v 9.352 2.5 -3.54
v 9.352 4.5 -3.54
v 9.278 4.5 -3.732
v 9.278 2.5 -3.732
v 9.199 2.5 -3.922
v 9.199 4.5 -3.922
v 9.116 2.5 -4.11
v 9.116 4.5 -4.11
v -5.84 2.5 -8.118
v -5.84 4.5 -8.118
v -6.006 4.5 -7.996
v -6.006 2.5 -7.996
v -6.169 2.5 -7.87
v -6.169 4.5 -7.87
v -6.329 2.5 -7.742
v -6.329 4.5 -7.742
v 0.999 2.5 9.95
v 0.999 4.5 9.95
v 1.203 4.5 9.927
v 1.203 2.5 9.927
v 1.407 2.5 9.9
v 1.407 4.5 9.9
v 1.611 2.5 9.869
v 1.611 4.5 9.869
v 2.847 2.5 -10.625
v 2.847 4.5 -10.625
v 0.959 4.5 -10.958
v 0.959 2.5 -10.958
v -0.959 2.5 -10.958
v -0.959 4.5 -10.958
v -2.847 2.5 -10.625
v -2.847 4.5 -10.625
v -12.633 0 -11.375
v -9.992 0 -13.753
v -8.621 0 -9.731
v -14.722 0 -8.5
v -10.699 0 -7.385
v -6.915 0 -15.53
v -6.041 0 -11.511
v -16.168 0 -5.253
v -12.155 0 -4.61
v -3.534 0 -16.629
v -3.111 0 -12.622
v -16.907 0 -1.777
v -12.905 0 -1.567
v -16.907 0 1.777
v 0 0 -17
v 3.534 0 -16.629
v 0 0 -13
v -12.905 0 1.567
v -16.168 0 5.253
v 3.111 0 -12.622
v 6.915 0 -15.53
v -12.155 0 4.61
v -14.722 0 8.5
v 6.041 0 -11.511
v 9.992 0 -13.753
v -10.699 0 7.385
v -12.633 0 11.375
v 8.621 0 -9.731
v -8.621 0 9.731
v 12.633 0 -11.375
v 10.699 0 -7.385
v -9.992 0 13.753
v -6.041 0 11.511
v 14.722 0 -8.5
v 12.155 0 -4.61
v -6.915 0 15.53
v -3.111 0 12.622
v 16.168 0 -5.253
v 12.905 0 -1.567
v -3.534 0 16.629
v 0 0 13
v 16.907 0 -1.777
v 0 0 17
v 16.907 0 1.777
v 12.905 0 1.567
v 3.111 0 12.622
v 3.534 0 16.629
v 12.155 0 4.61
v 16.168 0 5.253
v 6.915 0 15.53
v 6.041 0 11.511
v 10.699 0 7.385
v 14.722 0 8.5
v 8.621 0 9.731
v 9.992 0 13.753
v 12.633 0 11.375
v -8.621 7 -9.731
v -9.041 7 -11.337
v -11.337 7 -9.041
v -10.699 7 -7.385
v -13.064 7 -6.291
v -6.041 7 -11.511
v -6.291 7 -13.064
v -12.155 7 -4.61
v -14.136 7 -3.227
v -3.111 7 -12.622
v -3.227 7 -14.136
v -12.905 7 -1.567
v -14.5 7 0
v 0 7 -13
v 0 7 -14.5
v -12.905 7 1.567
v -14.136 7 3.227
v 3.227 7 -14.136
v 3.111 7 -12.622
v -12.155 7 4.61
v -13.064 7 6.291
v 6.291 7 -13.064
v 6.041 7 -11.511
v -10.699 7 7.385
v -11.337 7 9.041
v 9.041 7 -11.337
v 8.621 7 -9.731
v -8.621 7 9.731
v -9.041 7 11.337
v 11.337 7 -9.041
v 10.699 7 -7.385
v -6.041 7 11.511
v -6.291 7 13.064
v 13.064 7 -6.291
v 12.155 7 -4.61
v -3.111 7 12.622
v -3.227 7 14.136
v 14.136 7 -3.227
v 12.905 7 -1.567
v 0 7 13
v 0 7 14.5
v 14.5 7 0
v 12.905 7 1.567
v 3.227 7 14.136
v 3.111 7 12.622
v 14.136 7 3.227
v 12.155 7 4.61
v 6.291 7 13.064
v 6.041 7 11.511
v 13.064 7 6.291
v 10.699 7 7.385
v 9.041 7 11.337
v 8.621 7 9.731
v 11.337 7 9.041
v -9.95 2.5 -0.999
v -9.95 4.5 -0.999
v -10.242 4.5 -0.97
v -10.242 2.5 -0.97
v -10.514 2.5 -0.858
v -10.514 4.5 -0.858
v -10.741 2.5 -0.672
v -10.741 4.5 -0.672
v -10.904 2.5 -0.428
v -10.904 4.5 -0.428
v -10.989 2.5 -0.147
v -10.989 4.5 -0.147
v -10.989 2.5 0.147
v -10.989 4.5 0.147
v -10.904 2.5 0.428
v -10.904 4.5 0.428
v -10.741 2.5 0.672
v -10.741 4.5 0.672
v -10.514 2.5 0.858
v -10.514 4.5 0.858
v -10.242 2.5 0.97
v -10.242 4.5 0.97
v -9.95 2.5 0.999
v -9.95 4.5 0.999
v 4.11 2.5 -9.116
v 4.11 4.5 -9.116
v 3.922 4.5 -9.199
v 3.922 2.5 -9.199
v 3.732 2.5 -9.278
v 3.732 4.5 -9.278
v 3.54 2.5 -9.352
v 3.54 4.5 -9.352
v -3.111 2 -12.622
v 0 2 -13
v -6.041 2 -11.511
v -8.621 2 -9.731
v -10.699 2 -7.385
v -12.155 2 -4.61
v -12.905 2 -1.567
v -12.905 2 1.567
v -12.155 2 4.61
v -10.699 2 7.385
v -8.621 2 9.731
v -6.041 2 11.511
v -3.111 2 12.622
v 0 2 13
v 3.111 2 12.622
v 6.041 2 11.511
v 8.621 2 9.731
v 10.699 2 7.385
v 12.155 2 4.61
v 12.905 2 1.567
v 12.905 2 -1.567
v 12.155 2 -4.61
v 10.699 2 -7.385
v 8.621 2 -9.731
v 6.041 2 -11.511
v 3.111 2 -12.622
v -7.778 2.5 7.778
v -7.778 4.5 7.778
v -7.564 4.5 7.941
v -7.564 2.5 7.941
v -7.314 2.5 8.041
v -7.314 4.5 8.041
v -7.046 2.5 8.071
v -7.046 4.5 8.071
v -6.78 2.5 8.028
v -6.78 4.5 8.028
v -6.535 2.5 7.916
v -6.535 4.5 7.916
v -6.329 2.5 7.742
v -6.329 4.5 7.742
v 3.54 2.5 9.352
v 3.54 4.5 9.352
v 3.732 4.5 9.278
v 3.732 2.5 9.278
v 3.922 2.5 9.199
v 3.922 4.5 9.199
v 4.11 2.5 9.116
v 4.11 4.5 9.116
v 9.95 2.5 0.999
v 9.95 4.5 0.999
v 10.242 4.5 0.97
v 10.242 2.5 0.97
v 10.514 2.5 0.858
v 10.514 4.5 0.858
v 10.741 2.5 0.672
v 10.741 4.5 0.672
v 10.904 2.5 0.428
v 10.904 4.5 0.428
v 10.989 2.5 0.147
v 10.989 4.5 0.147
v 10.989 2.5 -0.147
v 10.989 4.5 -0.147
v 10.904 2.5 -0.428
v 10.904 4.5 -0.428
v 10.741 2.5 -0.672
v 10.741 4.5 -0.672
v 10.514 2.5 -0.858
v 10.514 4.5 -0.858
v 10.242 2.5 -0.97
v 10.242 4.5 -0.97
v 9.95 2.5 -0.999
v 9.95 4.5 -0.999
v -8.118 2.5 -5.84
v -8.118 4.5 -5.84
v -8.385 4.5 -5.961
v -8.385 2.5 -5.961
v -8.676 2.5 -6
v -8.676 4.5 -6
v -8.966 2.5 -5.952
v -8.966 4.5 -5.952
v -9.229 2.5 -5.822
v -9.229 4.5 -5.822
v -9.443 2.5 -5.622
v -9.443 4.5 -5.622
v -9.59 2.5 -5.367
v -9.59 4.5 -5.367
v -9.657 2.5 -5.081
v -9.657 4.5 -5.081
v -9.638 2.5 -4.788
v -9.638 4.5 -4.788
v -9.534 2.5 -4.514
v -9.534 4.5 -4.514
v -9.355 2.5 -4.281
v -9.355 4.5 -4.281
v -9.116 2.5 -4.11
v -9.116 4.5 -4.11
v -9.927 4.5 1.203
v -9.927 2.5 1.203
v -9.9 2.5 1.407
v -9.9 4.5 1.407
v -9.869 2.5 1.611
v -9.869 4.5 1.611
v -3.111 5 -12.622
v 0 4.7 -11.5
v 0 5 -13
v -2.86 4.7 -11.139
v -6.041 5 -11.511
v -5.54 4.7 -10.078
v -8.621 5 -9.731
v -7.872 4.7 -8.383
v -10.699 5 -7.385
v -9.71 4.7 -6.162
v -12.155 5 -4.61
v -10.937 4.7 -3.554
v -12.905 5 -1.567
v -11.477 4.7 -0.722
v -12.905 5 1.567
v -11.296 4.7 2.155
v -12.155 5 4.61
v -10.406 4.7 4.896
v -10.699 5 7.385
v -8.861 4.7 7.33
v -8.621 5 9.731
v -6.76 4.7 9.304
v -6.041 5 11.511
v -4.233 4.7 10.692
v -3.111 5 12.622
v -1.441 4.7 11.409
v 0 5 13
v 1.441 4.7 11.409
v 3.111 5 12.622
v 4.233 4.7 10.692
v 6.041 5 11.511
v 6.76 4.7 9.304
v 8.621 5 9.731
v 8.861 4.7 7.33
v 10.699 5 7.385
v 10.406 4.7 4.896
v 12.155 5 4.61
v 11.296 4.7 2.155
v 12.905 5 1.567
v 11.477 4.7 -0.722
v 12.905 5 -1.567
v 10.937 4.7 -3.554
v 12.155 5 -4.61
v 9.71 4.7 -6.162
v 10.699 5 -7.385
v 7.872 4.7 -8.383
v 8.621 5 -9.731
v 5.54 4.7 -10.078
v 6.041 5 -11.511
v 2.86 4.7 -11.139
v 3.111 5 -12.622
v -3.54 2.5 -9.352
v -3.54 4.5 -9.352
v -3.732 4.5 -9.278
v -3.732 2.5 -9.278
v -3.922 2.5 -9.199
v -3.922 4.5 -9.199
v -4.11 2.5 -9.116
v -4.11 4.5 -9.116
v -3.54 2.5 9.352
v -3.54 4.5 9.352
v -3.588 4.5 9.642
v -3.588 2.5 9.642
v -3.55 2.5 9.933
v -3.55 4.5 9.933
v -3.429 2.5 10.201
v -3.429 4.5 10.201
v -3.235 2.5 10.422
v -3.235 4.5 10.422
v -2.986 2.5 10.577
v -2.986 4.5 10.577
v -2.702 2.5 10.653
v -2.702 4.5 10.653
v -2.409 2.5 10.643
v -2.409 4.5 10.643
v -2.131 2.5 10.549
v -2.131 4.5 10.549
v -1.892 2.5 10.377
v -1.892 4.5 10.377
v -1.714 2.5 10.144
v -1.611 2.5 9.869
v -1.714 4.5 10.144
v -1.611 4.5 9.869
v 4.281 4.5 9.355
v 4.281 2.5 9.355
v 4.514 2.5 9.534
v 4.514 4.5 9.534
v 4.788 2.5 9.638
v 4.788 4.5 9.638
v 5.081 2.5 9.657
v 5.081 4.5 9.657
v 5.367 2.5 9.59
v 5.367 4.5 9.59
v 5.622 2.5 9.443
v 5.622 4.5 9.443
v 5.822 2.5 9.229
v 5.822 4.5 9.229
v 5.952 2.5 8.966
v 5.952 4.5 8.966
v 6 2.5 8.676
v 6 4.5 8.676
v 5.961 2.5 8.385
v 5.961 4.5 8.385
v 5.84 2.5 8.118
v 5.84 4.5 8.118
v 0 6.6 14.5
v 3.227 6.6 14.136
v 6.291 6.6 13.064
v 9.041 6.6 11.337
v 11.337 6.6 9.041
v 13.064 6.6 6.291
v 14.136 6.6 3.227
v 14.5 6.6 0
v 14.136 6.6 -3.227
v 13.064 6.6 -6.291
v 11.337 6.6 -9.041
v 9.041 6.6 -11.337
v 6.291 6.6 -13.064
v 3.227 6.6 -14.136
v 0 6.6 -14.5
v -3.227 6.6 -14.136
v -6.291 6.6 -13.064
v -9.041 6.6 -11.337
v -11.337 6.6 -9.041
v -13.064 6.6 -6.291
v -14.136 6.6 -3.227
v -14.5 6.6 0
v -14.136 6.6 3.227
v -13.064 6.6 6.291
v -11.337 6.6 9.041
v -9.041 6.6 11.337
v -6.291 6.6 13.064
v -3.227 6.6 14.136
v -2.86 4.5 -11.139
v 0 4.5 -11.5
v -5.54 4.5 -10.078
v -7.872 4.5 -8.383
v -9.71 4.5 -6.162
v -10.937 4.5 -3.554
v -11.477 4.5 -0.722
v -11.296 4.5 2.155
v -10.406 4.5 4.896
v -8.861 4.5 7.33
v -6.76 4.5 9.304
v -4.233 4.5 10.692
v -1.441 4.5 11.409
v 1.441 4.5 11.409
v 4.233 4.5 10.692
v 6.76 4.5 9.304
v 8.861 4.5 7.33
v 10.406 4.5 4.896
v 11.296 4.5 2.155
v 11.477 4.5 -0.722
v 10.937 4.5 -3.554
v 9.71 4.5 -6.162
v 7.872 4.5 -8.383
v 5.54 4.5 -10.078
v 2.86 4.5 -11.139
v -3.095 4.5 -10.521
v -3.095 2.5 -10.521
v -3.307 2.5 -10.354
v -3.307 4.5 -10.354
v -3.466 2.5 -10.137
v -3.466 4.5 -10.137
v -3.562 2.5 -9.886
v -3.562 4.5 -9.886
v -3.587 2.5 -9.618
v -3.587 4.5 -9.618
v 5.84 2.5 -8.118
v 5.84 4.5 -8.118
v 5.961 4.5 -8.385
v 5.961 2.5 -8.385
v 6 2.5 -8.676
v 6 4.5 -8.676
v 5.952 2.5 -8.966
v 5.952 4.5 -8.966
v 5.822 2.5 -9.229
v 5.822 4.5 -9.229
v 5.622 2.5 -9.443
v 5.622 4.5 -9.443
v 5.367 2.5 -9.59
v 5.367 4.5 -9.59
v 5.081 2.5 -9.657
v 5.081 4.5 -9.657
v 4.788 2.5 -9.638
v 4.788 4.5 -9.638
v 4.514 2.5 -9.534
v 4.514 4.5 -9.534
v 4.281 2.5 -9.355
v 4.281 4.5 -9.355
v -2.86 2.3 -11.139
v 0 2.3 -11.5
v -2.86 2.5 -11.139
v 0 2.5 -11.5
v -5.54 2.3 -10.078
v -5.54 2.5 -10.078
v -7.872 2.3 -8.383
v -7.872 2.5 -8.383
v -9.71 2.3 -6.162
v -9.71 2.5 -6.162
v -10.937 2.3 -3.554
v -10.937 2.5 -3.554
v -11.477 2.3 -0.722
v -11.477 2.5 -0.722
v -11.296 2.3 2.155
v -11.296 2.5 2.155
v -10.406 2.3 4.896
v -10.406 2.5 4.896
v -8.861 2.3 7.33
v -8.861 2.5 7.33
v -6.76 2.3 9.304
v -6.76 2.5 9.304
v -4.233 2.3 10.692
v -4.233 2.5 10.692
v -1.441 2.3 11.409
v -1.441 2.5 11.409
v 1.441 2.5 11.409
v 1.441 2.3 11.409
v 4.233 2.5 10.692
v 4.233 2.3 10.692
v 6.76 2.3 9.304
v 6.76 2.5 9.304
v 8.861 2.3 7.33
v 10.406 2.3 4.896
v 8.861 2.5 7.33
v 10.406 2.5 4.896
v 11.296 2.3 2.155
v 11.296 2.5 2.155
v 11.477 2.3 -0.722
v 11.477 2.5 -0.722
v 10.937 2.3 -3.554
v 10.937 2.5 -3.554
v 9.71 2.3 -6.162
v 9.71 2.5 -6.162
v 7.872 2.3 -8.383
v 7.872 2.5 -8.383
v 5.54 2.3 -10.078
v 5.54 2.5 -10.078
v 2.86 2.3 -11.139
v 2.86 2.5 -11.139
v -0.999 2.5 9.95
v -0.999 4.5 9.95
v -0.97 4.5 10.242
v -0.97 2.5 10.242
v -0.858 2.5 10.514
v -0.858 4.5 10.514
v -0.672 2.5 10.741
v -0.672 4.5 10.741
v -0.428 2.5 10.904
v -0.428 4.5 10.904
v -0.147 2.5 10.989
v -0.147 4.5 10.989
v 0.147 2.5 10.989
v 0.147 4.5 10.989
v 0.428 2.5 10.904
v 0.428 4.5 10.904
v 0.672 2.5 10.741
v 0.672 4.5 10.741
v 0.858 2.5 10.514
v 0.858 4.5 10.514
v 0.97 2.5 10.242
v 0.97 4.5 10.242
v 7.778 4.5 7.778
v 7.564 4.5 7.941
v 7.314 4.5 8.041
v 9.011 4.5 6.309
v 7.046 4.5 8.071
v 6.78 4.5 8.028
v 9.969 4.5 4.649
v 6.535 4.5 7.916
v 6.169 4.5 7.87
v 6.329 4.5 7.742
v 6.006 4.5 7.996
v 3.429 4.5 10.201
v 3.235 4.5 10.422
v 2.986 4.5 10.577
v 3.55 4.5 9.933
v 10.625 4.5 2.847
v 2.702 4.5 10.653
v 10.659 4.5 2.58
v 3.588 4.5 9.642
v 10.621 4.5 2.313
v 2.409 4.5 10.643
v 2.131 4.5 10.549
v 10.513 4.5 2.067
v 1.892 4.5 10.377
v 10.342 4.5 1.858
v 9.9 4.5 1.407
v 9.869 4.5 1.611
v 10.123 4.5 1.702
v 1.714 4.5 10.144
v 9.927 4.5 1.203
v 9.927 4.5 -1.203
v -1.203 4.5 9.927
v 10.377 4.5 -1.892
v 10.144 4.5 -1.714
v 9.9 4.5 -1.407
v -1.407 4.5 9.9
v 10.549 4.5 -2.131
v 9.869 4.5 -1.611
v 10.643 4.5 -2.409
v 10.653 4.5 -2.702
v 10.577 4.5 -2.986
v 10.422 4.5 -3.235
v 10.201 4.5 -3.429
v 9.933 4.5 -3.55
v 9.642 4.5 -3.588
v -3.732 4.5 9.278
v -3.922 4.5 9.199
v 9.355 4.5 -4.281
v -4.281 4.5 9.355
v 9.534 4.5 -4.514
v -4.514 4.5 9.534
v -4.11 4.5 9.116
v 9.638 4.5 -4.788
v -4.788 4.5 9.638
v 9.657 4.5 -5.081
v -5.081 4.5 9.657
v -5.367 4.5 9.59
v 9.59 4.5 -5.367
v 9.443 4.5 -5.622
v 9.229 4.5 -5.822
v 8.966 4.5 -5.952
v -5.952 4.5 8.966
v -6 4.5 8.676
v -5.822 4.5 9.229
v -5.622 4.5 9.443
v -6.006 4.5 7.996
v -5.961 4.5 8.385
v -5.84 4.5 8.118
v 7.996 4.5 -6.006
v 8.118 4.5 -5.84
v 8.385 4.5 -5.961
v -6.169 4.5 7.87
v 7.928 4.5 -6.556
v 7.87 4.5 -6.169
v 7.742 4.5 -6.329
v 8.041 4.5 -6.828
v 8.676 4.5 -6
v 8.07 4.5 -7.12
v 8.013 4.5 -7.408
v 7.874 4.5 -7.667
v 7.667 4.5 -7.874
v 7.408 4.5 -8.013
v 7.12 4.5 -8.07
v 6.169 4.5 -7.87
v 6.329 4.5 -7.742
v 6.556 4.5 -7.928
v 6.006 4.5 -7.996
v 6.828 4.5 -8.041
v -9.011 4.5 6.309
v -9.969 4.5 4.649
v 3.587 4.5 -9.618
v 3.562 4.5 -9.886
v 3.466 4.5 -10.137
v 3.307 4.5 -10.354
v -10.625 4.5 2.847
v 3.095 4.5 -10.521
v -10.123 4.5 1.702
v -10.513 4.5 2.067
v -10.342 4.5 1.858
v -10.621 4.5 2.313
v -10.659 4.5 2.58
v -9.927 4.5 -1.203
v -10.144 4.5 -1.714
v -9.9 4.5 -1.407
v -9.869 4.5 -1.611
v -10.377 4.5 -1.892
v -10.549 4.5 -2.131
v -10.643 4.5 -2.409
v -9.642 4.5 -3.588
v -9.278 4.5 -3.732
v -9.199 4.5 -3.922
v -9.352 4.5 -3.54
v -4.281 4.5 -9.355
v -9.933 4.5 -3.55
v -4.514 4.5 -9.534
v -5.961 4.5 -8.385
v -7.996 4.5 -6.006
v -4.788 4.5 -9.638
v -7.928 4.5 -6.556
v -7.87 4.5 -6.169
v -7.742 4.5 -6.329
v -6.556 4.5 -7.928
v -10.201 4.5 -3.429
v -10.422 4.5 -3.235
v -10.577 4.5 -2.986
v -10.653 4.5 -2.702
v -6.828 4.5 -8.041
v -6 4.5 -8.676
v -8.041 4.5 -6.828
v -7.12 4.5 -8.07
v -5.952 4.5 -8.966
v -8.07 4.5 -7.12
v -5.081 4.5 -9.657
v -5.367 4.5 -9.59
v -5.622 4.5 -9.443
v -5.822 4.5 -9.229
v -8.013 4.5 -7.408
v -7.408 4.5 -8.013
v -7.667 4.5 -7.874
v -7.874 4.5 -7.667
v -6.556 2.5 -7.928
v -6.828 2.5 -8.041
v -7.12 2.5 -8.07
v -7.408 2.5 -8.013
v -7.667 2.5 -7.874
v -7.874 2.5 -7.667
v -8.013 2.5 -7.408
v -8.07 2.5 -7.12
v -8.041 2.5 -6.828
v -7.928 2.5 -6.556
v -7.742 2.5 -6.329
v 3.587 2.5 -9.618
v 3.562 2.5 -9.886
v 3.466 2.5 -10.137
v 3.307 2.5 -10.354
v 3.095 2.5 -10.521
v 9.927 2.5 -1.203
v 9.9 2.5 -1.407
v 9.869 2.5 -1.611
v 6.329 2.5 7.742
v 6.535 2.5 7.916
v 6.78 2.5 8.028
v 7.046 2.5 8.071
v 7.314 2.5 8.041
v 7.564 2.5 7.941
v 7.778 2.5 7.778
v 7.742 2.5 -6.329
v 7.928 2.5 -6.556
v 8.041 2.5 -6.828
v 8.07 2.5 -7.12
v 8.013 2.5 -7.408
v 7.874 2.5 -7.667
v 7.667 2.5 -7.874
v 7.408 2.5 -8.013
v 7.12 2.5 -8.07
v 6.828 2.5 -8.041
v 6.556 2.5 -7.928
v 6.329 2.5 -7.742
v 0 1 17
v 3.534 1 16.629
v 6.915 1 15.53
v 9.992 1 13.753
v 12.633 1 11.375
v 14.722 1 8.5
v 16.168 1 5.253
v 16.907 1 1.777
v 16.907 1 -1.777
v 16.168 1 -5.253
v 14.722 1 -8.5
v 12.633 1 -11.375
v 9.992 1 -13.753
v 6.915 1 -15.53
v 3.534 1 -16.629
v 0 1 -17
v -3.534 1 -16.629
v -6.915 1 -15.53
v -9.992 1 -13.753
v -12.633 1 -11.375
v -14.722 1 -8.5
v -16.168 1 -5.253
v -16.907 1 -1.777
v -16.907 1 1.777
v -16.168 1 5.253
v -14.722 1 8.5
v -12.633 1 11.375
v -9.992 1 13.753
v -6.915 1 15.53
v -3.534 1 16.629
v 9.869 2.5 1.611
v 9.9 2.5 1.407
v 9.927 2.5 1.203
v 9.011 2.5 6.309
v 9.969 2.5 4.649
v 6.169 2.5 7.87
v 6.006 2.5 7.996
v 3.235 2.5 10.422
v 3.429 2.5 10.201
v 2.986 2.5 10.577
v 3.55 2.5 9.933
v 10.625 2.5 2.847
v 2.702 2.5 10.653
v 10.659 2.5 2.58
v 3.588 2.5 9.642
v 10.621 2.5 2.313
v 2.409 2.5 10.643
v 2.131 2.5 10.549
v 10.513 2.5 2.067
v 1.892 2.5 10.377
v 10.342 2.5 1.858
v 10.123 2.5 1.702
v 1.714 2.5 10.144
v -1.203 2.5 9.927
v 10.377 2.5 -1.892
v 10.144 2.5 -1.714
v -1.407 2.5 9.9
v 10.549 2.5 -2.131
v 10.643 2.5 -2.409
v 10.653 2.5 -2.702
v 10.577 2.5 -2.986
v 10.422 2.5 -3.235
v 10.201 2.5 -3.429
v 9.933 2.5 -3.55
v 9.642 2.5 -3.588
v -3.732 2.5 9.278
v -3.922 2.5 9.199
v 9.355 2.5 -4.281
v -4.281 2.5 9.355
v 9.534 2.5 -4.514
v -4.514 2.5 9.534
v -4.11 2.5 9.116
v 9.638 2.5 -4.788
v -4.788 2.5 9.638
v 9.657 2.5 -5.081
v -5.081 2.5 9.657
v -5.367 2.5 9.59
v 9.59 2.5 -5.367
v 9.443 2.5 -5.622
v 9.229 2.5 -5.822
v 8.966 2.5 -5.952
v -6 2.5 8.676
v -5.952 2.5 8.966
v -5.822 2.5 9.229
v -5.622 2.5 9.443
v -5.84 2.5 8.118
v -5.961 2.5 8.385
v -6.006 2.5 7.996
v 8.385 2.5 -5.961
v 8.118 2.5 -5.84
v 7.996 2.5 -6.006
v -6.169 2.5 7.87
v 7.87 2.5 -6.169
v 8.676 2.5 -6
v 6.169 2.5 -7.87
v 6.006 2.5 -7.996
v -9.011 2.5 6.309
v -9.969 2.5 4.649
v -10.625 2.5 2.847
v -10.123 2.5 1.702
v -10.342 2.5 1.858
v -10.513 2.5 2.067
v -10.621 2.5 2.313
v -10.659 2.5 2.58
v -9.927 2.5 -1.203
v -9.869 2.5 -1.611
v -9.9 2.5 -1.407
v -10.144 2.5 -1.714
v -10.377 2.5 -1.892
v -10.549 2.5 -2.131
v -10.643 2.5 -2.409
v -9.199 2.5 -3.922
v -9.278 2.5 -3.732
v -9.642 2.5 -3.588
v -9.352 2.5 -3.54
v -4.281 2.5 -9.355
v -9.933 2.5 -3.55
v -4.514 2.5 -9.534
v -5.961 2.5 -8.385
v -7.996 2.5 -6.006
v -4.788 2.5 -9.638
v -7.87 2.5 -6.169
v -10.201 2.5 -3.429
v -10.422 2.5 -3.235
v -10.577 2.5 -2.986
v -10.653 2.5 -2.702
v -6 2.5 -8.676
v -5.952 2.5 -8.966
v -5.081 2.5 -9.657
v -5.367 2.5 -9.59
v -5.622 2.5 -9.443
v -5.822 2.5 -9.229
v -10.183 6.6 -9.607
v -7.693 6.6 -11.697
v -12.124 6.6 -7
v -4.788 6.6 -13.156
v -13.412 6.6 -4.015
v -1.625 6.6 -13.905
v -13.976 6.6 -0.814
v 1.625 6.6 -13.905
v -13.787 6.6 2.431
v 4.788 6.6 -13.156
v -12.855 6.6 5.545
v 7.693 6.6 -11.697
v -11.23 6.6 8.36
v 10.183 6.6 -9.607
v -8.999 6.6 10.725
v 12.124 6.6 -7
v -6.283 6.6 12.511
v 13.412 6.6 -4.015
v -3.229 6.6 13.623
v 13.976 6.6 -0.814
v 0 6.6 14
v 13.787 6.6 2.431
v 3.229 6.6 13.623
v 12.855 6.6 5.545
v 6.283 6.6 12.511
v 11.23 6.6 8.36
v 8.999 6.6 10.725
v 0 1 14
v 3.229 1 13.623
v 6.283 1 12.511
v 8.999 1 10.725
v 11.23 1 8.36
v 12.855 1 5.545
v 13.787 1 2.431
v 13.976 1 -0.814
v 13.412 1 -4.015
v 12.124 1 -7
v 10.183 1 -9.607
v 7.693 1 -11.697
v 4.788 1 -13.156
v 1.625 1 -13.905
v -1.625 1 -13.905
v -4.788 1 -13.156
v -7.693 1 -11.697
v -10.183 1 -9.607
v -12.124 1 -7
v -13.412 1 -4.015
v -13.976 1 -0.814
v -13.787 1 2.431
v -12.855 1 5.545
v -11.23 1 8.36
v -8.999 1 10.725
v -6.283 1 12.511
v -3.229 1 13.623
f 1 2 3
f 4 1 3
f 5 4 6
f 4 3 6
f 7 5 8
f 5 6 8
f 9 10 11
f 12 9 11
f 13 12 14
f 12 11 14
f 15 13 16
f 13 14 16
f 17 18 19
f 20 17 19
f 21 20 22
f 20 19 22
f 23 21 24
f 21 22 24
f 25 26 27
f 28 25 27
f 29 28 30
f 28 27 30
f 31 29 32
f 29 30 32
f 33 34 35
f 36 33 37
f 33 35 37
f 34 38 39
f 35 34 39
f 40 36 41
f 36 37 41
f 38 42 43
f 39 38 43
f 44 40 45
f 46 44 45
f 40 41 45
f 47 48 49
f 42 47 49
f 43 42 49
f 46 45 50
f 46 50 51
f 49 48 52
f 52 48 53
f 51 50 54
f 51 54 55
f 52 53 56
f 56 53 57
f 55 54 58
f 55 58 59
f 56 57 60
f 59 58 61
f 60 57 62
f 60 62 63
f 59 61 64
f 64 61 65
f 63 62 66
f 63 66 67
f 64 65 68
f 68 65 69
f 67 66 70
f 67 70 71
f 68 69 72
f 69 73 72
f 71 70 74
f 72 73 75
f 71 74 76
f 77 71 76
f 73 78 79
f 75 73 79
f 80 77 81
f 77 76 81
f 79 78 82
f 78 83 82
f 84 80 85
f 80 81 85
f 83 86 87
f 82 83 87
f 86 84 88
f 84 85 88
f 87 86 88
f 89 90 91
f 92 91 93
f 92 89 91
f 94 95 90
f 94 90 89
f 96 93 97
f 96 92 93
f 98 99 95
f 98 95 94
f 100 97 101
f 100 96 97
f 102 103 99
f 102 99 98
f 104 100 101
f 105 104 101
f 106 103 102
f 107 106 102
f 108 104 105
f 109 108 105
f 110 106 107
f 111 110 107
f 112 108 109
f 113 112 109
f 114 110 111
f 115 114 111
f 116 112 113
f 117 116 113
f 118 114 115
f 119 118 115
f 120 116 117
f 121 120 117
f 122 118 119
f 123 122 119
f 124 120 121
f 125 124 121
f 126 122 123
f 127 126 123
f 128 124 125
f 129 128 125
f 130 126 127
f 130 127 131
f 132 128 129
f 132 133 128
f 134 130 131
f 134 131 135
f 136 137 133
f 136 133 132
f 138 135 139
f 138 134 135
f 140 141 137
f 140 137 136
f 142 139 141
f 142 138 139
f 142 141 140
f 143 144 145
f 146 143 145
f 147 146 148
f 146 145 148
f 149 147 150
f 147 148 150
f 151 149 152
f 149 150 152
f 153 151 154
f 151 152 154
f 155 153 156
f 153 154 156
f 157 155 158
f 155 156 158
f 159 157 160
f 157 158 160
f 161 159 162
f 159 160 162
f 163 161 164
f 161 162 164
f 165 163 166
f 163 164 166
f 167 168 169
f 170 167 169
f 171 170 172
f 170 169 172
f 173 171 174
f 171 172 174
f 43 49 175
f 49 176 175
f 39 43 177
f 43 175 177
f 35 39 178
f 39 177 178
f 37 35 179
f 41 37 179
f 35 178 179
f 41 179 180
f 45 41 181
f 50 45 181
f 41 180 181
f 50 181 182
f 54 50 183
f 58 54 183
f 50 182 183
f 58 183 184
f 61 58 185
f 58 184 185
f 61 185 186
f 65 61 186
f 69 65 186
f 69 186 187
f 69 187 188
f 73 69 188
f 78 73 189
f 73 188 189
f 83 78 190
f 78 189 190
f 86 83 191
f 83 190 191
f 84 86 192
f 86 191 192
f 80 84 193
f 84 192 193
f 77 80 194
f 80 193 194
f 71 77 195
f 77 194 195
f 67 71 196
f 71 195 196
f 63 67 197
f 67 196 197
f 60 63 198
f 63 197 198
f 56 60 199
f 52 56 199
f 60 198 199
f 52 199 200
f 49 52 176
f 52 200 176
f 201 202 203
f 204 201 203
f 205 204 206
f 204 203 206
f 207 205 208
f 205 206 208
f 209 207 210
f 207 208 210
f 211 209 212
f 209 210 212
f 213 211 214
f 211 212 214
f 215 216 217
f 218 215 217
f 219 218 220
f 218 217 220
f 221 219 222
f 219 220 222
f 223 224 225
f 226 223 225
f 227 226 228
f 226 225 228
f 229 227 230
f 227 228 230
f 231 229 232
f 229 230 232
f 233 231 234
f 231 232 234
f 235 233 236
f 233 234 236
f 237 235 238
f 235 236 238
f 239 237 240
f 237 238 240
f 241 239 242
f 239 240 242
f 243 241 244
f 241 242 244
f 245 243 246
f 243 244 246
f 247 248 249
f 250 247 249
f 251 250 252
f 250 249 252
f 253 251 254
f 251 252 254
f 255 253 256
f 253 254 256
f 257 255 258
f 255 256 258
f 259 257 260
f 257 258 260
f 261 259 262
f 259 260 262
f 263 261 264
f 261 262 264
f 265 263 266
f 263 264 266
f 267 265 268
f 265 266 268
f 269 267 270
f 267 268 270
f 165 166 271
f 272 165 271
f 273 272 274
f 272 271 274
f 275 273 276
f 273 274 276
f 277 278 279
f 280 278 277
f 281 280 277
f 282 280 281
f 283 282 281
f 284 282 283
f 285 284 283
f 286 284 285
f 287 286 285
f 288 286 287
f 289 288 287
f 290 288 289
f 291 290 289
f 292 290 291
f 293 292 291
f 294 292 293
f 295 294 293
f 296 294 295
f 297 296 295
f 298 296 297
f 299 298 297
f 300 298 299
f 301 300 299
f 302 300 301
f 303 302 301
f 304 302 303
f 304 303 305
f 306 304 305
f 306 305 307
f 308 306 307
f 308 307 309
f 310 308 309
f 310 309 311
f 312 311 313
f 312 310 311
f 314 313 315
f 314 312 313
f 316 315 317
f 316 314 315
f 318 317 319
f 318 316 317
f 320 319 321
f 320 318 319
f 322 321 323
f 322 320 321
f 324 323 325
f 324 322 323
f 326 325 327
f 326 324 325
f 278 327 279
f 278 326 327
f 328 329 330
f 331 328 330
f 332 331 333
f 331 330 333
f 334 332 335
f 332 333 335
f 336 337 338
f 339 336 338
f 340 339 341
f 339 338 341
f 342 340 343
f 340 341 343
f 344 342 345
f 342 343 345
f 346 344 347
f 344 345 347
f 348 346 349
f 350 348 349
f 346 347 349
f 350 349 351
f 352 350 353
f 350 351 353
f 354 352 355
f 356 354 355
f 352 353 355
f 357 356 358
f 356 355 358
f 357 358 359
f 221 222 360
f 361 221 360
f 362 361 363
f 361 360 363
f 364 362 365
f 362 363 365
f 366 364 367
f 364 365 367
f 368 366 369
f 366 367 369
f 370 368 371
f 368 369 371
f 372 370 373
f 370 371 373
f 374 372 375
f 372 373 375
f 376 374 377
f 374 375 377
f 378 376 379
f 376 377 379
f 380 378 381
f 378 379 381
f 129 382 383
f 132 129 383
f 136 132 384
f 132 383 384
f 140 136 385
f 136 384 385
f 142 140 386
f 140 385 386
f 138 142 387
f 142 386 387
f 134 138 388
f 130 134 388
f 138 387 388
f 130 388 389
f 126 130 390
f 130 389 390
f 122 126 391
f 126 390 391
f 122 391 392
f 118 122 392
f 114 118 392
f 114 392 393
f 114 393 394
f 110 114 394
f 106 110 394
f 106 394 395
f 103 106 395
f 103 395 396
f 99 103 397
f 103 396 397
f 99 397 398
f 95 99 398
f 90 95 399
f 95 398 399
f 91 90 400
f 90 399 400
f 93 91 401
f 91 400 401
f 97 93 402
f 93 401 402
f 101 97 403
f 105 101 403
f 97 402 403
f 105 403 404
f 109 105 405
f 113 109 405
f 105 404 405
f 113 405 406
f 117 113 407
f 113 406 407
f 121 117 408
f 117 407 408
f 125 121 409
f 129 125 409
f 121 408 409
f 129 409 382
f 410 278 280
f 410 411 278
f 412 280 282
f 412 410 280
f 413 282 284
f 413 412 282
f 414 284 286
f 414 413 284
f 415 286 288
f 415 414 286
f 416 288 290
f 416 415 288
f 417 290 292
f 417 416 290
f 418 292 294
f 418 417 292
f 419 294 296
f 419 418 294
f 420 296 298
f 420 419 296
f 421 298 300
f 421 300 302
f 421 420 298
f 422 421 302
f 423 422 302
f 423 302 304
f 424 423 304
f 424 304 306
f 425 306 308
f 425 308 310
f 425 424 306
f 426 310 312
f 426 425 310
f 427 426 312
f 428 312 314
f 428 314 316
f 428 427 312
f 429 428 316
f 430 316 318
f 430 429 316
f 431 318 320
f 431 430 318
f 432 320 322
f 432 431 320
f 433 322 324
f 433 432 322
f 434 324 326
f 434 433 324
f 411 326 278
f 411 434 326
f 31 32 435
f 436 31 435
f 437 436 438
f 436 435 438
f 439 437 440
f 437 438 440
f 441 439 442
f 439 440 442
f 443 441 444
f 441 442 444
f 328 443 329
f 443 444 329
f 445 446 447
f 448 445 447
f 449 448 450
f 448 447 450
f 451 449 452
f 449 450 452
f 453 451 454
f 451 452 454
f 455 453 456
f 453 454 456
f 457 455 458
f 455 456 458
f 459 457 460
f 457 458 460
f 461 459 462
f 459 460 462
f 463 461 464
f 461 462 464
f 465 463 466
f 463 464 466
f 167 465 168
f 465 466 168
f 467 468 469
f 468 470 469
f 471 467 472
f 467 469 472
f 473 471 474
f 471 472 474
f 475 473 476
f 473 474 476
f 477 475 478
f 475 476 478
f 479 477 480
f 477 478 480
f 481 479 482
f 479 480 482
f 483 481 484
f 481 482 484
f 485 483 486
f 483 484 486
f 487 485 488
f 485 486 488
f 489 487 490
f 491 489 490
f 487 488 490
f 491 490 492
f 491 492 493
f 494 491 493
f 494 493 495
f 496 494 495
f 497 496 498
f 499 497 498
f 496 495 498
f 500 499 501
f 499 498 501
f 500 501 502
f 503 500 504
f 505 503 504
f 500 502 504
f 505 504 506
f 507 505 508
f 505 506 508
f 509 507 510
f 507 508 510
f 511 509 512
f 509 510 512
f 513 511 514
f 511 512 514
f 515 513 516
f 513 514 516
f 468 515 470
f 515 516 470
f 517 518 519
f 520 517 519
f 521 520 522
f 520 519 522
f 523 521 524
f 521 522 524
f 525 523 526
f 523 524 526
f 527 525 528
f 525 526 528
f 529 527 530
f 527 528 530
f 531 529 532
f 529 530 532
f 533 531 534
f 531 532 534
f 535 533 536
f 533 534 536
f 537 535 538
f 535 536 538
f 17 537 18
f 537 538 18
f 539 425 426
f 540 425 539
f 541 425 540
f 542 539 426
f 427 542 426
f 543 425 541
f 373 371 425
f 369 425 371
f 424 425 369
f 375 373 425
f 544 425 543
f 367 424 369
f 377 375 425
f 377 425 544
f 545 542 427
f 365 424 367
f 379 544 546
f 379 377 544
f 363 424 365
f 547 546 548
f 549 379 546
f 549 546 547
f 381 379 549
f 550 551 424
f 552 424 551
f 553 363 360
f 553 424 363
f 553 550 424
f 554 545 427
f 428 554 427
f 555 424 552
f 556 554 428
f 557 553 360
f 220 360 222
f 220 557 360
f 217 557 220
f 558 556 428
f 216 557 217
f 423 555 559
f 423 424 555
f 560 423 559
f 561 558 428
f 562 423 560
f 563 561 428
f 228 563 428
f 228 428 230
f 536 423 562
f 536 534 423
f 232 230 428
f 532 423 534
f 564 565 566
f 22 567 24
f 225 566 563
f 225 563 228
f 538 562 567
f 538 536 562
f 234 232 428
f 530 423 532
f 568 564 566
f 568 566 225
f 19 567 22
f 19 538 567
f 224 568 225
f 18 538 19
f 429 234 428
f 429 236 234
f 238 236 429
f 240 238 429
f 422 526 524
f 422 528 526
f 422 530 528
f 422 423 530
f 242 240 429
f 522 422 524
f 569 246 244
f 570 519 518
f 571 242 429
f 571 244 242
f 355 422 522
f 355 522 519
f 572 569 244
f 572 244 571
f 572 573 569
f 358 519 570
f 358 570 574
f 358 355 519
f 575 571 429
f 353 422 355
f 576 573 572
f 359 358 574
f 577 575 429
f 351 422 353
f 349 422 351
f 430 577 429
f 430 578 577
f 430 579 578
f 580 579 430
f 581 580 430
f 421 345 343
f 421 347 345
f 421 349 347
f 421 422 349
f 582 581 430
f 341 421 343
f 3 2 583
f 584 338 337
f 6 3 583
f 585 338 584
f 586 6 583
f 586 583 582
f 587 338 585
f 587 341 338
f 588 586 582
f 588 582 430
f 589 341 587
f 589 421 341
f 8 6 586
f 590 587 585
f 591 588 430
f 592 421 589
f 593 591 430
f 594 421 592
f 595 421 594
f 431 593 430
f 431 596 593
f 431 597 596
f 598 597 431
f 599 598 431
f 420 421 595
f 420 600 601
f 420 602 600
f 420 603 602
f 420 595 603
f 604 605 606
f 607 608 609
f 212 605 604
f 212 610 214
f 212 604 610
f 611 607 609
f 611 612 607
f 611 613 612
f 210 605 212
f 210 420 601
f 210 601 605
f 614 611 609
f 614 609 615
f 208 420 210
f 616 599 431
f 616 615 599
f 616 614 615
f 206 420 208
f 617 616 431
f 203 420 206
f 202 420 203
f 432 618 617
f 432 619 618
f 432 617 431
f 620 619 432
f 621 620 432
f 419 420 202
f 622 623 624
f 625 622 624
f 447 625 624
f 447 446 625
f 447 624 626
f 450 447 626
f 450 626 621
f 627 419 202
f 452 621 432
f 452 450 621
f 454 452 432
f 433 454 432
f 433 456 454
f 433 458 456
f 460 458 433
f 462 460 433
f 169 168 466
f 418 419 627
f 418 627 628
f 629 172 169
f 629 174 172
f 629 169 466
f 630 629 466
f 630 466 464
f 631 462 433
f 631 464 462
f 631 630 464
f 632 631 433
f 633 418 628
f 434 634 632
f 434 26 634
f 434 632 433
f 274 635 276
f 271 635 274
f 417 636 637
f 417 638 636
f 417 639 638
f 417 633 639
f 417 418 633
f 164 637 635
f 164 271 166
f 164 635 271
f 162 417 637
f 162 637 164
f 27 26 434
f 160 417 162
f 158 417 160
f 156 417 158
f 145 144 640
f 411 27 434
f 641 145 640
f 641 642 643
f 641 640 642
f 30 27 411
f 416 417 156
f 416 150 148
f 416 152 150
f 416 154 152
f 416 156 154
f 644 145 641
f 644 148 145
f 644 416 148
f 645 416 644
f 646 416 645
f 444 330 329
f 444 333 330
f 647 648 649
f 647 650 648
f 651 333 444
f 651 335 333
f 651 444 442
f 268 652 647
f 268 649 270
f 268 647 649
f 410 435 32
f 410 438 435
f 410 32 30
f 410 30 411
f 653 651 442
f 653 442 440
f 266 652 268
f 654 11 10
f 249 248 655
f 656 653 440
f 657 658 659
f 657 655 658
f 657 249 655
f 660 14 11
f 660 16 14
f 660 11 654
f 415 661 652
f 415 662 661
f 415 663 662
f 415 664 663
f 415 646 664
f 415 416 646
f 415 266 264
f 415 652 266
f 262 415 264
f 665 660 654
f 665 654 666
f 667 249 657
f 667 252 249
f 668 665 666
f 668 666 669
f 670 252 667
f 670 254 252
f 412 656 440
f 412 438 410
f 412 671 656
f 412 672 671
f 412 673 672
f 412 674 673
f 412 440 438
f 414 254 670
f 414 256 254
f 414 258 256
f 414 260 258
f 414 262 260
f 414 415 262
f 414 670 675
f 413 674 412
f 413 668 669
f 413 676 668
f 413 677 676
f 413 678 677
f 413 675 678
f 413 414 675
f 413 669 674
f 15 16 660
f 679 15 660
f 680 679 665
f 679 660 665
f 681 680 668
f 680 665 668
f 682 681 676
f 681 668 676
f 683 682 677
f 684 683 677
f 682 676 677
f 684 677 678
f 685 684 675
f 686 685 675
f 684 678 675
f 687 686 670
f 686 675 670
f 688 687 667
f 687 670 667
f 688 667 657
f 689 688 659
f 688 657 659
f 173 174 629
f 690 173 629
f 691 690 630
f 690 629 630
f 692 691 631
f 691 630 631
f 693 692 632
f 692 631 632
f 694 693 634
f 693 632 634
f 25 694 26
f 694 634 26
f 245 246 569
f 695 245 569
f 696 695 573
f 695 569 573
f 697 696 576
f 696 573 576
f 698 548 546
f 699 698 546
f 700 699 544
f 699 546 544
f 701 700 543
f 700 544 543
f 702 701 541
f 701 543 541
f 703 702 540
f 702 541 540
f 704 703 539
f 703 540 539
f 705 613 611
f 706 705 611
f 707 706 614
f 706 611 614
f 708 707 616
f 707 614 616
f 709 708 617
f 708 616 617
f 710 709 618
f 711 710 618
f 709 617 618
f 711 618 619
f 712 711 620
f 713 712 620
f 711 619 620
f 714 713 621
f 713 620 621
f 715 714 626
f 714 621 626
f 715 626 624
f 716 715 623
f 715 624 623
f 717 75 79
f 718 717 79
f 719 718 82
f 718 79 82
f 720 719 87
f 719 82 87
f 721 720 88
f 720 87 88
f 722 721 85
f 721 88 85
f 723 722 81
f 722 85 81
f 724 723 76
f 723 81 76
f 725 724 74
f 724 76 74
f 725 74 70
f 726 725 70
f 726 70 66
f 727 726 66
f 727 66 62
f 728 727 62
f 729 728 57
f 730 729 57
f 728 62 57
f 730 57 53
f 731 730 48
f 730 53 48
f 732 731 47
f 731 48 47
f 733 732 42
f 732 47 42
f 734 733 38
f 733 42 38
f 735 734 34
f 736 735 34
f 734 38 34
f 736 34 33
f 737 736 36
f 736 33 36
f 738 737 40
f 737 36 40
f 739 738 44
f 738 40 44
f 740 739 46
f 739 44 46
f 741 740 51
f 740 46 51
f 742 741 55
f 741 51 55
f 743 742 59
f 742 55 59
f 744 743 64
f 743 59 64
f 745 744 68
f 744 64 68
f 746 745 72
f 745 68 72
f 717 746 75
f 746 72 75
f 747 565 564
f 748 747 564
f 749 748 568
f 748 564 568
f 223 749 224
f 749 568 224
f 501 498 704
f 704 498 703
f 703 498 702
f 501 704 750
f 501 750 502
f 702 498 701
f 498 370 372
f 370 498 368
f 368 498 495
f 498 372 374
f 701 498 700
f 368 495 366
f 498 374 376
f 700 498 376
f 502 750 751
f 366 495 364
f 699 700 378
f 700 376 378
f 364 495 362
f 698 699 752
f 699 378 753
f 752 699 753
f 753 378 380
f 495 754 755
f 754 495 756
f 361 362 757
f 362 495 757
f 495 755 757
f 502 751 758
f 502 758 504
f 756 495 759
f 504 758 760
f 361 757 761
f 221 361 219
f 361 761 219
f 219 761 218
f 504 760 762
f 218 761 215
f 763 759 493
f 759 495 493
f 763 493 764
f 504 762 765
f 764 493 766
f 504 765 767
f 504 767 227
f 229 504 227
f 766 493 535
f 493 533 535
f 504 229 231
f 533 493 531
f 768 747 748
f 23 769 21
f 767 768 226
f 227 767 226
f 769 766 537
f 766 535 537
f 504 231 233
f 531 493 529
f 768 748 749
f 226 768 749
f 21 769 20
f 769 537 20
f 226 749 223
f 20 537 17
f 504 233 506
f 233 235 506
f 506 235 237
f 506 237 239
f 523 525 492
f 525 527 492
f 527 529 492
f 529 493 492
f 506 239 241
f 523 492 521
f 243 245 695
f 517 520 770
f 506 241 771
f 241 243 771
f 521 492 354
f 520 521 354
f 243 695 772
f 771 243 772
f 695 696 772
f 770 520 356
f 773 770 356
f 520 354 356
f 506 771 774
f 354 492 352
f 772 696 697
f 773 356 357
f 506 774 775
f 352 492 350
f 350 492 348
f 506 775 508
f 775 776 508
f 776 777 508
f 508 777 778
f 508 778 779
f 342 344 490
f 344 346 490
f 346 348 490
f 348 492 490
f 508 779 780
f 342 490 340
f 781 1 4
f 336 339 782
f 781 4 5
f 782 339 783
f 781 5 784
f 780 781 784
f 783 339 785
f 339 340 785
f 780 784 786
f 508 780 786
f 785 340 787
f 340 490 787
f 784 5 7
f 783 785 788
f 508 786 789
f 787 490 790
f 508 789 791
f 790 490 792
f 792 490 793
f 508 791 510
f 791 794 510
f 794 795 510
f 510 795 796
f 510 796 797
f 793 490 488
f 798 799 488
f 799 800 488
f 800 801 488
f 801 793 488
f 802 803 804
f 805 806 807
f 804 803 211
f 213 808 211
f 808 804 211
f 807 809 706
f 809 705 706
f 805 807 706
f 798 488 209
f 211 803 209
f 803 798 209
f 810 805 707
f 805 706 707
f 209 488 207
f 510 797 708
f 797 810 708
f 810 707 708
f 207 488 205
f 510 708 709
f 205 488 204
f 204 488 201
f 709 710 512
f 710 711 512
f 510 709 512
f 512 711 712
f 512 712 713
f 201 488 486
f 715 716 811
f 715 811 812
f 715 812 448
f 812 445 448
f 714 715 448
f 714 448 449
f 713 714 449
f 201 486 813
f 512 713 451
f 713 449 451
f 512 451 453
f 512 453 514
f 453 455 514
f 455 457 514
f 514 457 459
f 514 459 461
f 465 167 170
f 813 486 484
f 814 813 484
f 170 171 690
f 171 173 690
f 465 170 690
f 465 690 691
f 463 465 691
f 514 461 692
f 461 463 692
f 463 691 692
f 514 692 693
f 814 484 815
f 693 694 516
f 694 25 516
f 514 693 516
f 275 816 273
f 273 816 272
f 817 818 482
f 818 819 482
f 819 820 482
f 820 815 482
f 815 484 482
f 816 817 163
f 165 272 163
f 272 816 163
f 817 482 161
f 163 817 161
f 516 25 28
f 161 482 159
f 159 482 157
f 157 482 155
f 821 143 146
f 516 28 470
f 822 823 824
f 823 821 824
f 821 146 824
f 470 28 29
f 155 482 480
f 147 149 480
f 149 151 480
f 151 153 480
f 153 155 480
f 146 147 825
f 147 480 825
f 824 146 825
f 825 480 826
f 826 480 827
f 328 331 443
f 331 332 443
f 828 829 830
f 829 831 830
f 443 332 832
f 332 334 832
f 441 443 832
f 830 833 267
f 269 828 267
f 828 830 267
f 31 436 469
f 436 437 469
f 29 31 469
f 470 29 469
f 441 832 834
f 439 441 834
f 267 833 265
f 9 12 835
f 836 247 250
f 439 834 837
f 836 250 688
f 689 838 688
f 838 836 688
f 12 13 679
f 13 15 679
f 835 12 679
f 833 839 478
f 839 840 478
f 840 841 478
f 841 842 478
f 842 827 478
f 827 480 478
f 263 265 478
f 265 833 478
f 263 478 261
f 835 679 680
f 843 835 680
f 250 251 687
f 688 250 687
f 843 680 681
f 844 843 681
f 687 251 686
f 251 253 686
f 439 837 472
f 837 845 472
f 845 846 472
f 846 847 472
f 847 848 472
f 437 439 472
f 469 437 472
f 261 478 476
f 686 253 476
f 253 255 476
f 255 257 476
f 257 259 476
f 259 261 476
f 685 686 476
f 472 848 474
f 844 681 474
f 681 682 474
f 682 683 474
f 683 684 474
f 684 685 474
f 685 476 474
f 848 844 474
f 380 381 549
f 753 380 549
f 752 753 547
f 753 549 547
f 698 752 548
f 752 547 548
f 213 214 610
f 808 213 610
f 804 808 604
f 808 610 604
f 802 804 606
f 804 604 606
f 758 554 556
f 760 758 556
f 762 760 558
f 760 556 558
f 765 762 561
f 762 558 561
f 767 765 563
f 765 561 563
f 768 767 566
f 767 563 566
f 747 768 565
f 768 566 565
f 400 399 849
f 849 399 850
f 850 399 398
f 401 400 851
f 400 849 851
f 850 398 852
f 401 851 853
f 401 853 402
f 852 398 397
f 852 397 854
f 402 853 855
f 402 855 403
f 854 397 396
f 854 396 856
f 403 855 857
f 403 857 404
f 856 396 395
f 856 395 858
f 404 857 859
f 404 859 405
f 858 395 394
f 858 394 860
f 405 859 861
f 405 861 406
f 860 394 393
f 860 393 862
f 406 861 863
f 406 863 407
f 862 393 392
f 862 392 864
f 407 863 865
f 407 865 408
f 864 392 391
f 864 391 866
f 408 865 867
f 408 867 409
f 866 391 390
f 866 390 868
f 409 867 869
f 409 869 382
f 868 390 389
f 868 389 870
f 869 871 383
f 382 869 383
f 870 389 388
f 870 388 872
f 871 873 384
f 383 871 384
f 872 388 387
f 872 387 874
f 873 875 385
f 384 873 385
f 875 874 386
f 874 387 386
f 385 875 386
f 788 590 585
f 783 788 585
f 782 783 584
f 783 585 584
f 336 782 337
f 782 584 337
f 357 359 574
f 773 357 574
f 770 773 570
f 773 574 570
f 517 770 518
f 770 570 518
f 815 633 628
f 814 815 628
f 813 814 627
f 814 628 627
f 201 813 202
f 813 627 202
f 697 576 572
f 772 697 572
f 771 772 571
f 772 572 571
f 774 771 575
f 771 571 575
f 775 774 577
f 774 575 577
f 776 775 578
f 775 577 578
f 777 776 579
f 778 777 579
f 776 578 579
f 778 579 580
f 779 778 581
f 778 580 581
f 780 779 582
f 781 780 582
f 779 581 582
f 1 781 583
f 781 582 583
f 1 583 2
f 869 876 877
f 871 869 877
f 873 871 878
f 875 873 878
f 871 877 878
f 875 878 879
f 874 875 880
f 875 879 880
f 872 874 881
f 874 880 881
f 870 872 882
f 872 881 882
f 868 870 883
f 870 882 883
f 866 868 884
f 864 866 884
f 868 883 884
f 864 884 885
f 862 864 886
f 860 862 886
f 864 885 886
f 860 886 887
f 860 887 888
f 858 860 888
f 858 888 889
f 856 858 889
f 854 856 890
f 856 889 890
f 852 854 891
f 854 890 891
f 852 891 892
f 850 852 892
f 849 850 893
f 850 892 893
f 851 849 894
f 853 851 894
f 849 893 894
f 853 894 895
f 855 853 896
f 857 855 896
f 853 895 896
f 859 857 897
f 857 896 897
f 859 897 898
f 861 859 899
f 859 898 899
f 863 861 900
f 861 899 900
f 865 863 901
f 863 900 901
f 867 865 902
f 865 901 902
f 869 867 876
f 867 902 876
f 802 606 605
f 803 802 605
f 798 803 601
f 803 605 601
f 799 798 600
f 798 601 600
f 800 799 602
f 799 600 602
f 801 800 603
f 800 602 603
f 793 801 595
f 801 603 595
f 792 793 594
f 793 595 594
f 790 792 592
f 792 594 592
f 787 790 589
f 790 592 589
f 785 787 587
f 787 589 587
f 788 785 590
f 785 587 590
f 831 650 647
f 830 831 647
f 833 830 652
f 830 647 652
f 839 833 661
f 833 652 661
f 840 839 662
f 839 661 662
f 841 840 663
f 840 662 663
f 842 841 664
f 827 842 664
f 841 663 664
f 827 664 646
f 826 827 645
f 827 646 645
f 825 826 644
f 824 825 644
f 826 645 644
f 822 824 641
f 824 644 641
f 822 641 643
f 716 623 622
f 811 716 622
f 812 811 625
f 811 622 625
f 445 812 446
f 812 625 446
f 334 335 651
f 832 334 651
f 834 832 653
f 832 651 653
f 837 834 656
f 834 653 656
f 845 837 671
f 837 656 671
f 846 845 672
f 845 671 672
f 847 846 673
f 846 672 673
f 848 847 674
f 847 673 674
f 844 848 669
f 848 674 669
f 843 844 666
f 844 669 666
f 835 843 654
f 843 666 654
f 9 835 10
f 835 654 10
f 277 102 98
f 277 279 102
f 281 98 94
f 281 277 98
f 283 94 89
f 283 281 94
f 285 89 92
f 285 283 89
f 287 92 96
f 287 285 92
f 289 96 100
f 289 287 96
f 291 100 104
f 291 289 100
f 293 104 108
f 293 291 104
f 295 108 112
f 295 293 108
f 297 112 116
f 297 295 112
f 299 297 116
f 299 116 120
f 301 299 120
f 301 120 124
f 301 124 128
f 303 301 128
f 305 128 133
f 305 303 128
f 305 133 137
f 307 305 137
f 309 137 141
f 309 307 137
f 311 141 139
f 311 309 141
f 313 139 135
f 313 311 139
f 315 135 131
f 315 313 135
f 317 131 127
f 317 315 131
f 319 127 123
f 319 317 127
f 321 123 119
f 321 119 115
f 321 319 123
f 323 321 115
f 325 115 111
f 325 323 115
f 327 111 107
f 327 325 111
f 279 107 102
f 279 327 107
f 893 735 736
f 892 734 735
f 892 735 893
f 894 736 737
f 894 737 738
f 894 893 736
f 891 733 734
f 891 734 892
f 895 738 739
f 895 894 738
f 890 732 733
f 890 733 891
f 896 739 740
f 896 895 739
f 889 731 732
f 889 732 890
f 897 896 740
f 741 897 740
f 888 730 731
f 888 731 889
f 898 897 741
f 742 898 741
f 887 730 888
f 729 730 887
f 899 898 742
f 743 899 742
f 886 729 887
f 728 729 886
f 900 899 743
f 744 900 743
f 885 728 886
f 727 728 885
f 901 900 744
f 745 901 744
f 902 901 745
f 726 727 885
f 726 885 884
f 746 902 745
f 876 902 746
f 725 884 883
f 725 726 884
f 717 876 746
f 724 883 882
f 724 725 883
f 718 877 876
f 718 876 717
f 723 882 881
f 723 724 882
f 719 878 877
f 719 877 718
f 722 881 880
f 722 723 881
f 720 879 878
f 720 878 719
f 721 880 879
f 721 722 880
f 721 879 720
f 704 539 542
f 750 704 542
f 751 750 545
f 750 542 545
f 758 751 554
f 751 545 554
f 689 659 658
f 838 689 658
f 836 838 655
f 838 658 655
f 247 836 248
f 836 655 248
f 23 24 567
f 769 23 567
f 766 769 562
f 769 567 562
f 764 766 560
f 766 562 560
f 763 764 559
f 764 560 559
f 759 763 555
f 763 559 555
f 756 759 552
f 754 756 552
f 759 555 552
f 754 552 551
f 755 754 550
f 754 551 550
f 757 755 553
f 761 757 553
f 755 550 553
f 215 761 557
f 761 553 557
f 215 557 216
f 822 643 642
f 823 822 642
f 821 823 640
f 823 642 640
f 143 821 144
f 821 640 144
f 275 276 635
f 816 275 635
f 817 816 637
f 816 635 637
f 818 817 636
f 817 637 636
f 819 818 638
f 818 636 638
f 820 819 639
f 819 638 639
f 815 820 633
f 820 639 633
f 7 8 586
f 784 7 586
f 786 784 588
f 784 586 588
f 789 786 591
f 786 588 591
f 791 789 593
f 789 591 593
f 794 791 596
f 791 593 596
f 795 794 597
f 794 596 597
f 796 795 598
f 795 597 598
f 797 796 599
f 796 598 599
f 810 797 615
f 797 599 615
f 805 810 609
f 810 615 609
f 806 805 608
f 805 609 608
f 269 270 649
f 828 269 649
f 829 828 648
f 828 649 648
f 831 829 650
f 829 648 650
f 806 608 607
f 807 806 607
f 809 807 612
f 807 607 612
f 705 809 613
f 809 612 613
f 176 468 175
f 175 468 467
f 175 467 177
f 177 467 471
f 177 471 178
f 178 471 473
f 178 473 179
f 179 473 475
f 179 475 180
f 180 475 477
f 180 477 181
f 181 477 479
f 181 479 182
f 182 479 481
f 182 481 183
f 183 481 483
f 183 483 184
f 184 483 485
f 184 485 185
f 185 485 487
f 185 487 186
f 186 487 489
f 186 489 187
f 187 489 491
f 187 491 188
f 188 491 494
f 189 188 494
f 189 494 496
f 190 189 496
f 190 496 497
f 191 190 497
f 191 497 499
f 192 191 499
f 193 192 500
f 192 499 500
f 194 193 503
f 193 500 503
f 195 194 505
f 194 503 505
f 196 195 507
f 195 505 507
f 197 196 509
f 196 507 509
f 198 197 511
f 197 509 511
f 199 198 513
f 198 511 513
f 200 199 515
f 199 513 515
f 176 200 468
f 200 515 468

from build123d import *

# Parameters (mm, degrees)
SKETCH_1_R          = 17
EXTRUDE_1_DEPTH     = 1
SKETCH_2_R          = 14
EXTRUDE_2_DEPTH     = 5.6
SKETCH_3_R          = 14.5
EXTRUDE_3_DEPTH     = 0.4
CUT_EXTRUDE_1_REACH = 26.459


with BuildPart() as part:
    # 草图1 → 凸台-拉伸1 (new body)
    with BuildSketch(Plane(origin=(0, 0, 0), x_dir=(1, 0, 0), z_dir=(0, 1, 0))):
        with Locations(Location((0, 0, 0), (0, 0, 270))):
            Circle(SKETCH_1_R)
    extrude(amount=EXTRUDE_1_DEPTH)

    # 草图2 → 凸台-拉伸2 (add)
    with BuildSketch(Plane(origin=(0, 1, 0), x_dir=(1, 0, 0), z_dir=(0, 1, 0))):
        with Locations(Location((0, 0, 0), (0, 0, 270))):
            Circle(SKETCH_2_R)
    extrude(amount=EXTRUDE_2_DEPTH)

    # 草图3 → 凸台-拉伸3 (add)
    with BuildSketch(Plane(origin=(0, 6.6, 0), x_dir=(1, 0, 0), z_dir=(0, 1, 0))):
        with Locations(Location((0, 0, 0), (0, 0, 270))):
            Circle(SKETCH_3_R)
    extrude(amount=EXTRUDE_3_DEPTH)

    # 草图4 → 切除-旋转1 (revolve, cut)
    with BuildSketch(Plane(origin=(0, 0, 0), x_dir=(0, 0, -1), z_dir=(1, 0, 0))):
        Polygon((0, 0), (13, 0), (13, 2), (11.5, 2.3), (11.5, 2.5), (0, 2.5), align=None)
        Polygon((11.5, 4.7), (11.5, 4.5), (0, 4.5), (0, 7), (13, 7), (13, 5), align=None)
    revolve(axis=Axis((0, 4.5, 0), (0, 1, 0)), mode=Mode.SUBTRACT)

    # 草图5 → 切除-拉伸1 (cut, up to next)
    with BuildSketch(Plane(origin=(0, 4.5, 0), x_dir=(1, 0, 0), z_dir=(0, 1, 0)), mode=Mode.PRIVATE) as cut_extrude_1_sk1:
        with BuildLine():
            ThreePointArc((3.539967162, 9.352466653), (3.466448921, 10.137444482), (2.847009496, 10.625184089))
            ThreePointArc((2.847009496, 10.625184089), (0, 11), (-2.847009496, 10.625184089))
            ThreePointArc((-2.847009496, 10.625184089), (-3.466448921, 10.137444482), (-3.539967162, 9.352466653))
            ThreePointArc((-3.539967162, 9.352466653), (-3.826834324, 9.238795325), (-4.110057805, 9.116327377))
            ThreePointArc((-4.110057805, 9.116327377), (-5.5, 9.526279442), (-5.839942195, 8.117578159))
            ThreePointArc((-5.839942195, 8.117578159), (-6.08761429, 7.933533403), (-6.329490128, 7.741934817))
            ThreePointArc((-6.329490128, 7.741934817), (-7.778174593, 7.778174593), (-7.741934817, 6.329490128))
            ThreePointArc((-7.741934817, 6.329490128), (-7.933533403, 6.08761429), (-8.117578159, 5.839942195))
            ThreePointArc((-8.117578159, 5.839942195), (-9.526279442, 5.5), (-9.116327377, 4.110057805))
            ThreePointArc((-9.116327377, 4.110057805), (-9.238795325, 3.826834324), (-9.352466653, 3.539967162))
            ThreePointArc((-9.352466653, 3.539967162), (-10.625184089, 2.847009496), (-9.86945729, 1.610531835))
            ThreePointArc((-9.86945729, 1.610531835), (-9.914448614, 1.305261922), (-9.95, 0.998749218))
            ThreePointArc((-9.95, 0.998749218), (-11, 0), (-9.95, -0.998749218))
            ThreePointArc((-9.95, -0.998749218), (-9.914448614, -1.305261922), (-9.86945729, -1.610531835))
            ThreePointArc((-9.86945729, -1.610531835), (-10.512508911, -2.066689415), (-10.625184089, -2.847009496))
            ThreePointArc((-10.625184089, -2.847009496), (-9.526279442, -5.5), (-7.778174593, -7.778174593))
            ThreePointArc((-7.778174593, -7.778174593), (-7.046059991, -8.070755067), (-6.329490128, -7.741934817))
            ThreePointArc((-6.329490128, -7.741934817), (-6.08761429, -7.933533403), (-5.839942195, -8.117578159))
            ThreePointArc((-5.839942195, -8.117578159), (-5.5, -9.526279442), (-4.110057805, -9.116327377))
            ThreePointArc((-4.110057805, -9.116327377), (-3.826834324, -9.238795325), (-3.539967162, -9.352466653))
            ThreePointArc((-3.539967162, -9.352466653), (-2.847009496, -10.625184089), (-1.610531835, -9.86945729))
            ThreePointArc((-1.610531835, -9.86945729), (-1.305261922, -9.914448614), (-0.998749218, -9.95))
            ThreePointArc((-0.998749218, -9.95), (0, -11), (0.998749218, -9.95))
            ThreePointArc((0.998749218, -9.95), (1.305261922, -9.914448614), (1.610531835, -9.86945729))
            ThreePointArc((1.610531835, -9.86945729), (2.847009496, -10.625184089), (3.539967162, -9.352466653))
            ThreePointArc((3.539967162, -9.352466653), (3.826834324, -9.238795325), (4.110057805, -9.116327377))
            ThreePointArc((4.110057805, -9.116327377), (5.5, -9.526279442), (5.839942195, -8.117578159))
            ThreePointArc((5.839942195, -8.117578159), (6.08761429, -7.933533403), (6.329490128, -7.741934817))
            ThreePointArc((6.329490128, -7.741934817), (7.046059991, -8.070755067), (7.778174593, -7.778174593))
            ThreePointArc((7.778174593, -7.778174593), (9.526279442, -5.5), (10.625184089, -2.847009496))
            ThreePointArc((10.625184089, -2.847009496), (10.512508911, -2.066689415), (9.86945729, -1.610531835))
            ThreePointArc((9.86945729, -1.610531835), (9.914448614, -1.305261922), (9.95, -0.998749218))
            ThreePointArc((9.95, -0.998749218), (11, 0), (9.95, 0.998749218))
            ThreePointArc((9.95, 0.998749218), (9.914448614, 1.305261922), (9.86945729, 1.610531835))
            ThreePointArc((9.86945729, 1.610531835), (10.625184089, 2.847009496), (9.352466653, 3.539967162))
            ThreePointArc((9.352466653, 3.539967162), (9.238795325, 3.826834324), (9.116327377, 4.110057805))
            ThreePointArc((9.116327377, 4.110057805), (9.526279442, 5.5), (8.117578159, 5.839942195))
            ThreePointArc((8.117578159, 5.839942195), (7.933533403, 6.08761429), (7.741934817, 6.329490128))
            ThreePointArc((7.741934817, 6.329490128), (7.778174593, 7.778174593), (6.329490128, 7.741934817))
            ThreePointArc((6.329490128, 7.741934817), (6.08761429, 7.933533403), (5.839942195, 8.117578159))
            ThreePointArc((5.839942195, 8.117578159), (5.5, 9.526279442), (4.110057805, 9.116327377))
            ThreePointArc((4.110057805, 9.116327377), (3.826834324, 9.238795325), (3.539967162, 9.352466653))
        make_face()
    cut_extrude_1_tool1 = extrude(cut_extrude_1_sk1.sketch, amount=-CUT_EXTRUDE_1_REACH, mode=Mode.PRIVATE) & part.part
    add(cut_extrude_1_tool1.solids().sort_by_distance((0, 4.5, 0))[0], mode=Mode.SUBTRACT)


solid = part.part
